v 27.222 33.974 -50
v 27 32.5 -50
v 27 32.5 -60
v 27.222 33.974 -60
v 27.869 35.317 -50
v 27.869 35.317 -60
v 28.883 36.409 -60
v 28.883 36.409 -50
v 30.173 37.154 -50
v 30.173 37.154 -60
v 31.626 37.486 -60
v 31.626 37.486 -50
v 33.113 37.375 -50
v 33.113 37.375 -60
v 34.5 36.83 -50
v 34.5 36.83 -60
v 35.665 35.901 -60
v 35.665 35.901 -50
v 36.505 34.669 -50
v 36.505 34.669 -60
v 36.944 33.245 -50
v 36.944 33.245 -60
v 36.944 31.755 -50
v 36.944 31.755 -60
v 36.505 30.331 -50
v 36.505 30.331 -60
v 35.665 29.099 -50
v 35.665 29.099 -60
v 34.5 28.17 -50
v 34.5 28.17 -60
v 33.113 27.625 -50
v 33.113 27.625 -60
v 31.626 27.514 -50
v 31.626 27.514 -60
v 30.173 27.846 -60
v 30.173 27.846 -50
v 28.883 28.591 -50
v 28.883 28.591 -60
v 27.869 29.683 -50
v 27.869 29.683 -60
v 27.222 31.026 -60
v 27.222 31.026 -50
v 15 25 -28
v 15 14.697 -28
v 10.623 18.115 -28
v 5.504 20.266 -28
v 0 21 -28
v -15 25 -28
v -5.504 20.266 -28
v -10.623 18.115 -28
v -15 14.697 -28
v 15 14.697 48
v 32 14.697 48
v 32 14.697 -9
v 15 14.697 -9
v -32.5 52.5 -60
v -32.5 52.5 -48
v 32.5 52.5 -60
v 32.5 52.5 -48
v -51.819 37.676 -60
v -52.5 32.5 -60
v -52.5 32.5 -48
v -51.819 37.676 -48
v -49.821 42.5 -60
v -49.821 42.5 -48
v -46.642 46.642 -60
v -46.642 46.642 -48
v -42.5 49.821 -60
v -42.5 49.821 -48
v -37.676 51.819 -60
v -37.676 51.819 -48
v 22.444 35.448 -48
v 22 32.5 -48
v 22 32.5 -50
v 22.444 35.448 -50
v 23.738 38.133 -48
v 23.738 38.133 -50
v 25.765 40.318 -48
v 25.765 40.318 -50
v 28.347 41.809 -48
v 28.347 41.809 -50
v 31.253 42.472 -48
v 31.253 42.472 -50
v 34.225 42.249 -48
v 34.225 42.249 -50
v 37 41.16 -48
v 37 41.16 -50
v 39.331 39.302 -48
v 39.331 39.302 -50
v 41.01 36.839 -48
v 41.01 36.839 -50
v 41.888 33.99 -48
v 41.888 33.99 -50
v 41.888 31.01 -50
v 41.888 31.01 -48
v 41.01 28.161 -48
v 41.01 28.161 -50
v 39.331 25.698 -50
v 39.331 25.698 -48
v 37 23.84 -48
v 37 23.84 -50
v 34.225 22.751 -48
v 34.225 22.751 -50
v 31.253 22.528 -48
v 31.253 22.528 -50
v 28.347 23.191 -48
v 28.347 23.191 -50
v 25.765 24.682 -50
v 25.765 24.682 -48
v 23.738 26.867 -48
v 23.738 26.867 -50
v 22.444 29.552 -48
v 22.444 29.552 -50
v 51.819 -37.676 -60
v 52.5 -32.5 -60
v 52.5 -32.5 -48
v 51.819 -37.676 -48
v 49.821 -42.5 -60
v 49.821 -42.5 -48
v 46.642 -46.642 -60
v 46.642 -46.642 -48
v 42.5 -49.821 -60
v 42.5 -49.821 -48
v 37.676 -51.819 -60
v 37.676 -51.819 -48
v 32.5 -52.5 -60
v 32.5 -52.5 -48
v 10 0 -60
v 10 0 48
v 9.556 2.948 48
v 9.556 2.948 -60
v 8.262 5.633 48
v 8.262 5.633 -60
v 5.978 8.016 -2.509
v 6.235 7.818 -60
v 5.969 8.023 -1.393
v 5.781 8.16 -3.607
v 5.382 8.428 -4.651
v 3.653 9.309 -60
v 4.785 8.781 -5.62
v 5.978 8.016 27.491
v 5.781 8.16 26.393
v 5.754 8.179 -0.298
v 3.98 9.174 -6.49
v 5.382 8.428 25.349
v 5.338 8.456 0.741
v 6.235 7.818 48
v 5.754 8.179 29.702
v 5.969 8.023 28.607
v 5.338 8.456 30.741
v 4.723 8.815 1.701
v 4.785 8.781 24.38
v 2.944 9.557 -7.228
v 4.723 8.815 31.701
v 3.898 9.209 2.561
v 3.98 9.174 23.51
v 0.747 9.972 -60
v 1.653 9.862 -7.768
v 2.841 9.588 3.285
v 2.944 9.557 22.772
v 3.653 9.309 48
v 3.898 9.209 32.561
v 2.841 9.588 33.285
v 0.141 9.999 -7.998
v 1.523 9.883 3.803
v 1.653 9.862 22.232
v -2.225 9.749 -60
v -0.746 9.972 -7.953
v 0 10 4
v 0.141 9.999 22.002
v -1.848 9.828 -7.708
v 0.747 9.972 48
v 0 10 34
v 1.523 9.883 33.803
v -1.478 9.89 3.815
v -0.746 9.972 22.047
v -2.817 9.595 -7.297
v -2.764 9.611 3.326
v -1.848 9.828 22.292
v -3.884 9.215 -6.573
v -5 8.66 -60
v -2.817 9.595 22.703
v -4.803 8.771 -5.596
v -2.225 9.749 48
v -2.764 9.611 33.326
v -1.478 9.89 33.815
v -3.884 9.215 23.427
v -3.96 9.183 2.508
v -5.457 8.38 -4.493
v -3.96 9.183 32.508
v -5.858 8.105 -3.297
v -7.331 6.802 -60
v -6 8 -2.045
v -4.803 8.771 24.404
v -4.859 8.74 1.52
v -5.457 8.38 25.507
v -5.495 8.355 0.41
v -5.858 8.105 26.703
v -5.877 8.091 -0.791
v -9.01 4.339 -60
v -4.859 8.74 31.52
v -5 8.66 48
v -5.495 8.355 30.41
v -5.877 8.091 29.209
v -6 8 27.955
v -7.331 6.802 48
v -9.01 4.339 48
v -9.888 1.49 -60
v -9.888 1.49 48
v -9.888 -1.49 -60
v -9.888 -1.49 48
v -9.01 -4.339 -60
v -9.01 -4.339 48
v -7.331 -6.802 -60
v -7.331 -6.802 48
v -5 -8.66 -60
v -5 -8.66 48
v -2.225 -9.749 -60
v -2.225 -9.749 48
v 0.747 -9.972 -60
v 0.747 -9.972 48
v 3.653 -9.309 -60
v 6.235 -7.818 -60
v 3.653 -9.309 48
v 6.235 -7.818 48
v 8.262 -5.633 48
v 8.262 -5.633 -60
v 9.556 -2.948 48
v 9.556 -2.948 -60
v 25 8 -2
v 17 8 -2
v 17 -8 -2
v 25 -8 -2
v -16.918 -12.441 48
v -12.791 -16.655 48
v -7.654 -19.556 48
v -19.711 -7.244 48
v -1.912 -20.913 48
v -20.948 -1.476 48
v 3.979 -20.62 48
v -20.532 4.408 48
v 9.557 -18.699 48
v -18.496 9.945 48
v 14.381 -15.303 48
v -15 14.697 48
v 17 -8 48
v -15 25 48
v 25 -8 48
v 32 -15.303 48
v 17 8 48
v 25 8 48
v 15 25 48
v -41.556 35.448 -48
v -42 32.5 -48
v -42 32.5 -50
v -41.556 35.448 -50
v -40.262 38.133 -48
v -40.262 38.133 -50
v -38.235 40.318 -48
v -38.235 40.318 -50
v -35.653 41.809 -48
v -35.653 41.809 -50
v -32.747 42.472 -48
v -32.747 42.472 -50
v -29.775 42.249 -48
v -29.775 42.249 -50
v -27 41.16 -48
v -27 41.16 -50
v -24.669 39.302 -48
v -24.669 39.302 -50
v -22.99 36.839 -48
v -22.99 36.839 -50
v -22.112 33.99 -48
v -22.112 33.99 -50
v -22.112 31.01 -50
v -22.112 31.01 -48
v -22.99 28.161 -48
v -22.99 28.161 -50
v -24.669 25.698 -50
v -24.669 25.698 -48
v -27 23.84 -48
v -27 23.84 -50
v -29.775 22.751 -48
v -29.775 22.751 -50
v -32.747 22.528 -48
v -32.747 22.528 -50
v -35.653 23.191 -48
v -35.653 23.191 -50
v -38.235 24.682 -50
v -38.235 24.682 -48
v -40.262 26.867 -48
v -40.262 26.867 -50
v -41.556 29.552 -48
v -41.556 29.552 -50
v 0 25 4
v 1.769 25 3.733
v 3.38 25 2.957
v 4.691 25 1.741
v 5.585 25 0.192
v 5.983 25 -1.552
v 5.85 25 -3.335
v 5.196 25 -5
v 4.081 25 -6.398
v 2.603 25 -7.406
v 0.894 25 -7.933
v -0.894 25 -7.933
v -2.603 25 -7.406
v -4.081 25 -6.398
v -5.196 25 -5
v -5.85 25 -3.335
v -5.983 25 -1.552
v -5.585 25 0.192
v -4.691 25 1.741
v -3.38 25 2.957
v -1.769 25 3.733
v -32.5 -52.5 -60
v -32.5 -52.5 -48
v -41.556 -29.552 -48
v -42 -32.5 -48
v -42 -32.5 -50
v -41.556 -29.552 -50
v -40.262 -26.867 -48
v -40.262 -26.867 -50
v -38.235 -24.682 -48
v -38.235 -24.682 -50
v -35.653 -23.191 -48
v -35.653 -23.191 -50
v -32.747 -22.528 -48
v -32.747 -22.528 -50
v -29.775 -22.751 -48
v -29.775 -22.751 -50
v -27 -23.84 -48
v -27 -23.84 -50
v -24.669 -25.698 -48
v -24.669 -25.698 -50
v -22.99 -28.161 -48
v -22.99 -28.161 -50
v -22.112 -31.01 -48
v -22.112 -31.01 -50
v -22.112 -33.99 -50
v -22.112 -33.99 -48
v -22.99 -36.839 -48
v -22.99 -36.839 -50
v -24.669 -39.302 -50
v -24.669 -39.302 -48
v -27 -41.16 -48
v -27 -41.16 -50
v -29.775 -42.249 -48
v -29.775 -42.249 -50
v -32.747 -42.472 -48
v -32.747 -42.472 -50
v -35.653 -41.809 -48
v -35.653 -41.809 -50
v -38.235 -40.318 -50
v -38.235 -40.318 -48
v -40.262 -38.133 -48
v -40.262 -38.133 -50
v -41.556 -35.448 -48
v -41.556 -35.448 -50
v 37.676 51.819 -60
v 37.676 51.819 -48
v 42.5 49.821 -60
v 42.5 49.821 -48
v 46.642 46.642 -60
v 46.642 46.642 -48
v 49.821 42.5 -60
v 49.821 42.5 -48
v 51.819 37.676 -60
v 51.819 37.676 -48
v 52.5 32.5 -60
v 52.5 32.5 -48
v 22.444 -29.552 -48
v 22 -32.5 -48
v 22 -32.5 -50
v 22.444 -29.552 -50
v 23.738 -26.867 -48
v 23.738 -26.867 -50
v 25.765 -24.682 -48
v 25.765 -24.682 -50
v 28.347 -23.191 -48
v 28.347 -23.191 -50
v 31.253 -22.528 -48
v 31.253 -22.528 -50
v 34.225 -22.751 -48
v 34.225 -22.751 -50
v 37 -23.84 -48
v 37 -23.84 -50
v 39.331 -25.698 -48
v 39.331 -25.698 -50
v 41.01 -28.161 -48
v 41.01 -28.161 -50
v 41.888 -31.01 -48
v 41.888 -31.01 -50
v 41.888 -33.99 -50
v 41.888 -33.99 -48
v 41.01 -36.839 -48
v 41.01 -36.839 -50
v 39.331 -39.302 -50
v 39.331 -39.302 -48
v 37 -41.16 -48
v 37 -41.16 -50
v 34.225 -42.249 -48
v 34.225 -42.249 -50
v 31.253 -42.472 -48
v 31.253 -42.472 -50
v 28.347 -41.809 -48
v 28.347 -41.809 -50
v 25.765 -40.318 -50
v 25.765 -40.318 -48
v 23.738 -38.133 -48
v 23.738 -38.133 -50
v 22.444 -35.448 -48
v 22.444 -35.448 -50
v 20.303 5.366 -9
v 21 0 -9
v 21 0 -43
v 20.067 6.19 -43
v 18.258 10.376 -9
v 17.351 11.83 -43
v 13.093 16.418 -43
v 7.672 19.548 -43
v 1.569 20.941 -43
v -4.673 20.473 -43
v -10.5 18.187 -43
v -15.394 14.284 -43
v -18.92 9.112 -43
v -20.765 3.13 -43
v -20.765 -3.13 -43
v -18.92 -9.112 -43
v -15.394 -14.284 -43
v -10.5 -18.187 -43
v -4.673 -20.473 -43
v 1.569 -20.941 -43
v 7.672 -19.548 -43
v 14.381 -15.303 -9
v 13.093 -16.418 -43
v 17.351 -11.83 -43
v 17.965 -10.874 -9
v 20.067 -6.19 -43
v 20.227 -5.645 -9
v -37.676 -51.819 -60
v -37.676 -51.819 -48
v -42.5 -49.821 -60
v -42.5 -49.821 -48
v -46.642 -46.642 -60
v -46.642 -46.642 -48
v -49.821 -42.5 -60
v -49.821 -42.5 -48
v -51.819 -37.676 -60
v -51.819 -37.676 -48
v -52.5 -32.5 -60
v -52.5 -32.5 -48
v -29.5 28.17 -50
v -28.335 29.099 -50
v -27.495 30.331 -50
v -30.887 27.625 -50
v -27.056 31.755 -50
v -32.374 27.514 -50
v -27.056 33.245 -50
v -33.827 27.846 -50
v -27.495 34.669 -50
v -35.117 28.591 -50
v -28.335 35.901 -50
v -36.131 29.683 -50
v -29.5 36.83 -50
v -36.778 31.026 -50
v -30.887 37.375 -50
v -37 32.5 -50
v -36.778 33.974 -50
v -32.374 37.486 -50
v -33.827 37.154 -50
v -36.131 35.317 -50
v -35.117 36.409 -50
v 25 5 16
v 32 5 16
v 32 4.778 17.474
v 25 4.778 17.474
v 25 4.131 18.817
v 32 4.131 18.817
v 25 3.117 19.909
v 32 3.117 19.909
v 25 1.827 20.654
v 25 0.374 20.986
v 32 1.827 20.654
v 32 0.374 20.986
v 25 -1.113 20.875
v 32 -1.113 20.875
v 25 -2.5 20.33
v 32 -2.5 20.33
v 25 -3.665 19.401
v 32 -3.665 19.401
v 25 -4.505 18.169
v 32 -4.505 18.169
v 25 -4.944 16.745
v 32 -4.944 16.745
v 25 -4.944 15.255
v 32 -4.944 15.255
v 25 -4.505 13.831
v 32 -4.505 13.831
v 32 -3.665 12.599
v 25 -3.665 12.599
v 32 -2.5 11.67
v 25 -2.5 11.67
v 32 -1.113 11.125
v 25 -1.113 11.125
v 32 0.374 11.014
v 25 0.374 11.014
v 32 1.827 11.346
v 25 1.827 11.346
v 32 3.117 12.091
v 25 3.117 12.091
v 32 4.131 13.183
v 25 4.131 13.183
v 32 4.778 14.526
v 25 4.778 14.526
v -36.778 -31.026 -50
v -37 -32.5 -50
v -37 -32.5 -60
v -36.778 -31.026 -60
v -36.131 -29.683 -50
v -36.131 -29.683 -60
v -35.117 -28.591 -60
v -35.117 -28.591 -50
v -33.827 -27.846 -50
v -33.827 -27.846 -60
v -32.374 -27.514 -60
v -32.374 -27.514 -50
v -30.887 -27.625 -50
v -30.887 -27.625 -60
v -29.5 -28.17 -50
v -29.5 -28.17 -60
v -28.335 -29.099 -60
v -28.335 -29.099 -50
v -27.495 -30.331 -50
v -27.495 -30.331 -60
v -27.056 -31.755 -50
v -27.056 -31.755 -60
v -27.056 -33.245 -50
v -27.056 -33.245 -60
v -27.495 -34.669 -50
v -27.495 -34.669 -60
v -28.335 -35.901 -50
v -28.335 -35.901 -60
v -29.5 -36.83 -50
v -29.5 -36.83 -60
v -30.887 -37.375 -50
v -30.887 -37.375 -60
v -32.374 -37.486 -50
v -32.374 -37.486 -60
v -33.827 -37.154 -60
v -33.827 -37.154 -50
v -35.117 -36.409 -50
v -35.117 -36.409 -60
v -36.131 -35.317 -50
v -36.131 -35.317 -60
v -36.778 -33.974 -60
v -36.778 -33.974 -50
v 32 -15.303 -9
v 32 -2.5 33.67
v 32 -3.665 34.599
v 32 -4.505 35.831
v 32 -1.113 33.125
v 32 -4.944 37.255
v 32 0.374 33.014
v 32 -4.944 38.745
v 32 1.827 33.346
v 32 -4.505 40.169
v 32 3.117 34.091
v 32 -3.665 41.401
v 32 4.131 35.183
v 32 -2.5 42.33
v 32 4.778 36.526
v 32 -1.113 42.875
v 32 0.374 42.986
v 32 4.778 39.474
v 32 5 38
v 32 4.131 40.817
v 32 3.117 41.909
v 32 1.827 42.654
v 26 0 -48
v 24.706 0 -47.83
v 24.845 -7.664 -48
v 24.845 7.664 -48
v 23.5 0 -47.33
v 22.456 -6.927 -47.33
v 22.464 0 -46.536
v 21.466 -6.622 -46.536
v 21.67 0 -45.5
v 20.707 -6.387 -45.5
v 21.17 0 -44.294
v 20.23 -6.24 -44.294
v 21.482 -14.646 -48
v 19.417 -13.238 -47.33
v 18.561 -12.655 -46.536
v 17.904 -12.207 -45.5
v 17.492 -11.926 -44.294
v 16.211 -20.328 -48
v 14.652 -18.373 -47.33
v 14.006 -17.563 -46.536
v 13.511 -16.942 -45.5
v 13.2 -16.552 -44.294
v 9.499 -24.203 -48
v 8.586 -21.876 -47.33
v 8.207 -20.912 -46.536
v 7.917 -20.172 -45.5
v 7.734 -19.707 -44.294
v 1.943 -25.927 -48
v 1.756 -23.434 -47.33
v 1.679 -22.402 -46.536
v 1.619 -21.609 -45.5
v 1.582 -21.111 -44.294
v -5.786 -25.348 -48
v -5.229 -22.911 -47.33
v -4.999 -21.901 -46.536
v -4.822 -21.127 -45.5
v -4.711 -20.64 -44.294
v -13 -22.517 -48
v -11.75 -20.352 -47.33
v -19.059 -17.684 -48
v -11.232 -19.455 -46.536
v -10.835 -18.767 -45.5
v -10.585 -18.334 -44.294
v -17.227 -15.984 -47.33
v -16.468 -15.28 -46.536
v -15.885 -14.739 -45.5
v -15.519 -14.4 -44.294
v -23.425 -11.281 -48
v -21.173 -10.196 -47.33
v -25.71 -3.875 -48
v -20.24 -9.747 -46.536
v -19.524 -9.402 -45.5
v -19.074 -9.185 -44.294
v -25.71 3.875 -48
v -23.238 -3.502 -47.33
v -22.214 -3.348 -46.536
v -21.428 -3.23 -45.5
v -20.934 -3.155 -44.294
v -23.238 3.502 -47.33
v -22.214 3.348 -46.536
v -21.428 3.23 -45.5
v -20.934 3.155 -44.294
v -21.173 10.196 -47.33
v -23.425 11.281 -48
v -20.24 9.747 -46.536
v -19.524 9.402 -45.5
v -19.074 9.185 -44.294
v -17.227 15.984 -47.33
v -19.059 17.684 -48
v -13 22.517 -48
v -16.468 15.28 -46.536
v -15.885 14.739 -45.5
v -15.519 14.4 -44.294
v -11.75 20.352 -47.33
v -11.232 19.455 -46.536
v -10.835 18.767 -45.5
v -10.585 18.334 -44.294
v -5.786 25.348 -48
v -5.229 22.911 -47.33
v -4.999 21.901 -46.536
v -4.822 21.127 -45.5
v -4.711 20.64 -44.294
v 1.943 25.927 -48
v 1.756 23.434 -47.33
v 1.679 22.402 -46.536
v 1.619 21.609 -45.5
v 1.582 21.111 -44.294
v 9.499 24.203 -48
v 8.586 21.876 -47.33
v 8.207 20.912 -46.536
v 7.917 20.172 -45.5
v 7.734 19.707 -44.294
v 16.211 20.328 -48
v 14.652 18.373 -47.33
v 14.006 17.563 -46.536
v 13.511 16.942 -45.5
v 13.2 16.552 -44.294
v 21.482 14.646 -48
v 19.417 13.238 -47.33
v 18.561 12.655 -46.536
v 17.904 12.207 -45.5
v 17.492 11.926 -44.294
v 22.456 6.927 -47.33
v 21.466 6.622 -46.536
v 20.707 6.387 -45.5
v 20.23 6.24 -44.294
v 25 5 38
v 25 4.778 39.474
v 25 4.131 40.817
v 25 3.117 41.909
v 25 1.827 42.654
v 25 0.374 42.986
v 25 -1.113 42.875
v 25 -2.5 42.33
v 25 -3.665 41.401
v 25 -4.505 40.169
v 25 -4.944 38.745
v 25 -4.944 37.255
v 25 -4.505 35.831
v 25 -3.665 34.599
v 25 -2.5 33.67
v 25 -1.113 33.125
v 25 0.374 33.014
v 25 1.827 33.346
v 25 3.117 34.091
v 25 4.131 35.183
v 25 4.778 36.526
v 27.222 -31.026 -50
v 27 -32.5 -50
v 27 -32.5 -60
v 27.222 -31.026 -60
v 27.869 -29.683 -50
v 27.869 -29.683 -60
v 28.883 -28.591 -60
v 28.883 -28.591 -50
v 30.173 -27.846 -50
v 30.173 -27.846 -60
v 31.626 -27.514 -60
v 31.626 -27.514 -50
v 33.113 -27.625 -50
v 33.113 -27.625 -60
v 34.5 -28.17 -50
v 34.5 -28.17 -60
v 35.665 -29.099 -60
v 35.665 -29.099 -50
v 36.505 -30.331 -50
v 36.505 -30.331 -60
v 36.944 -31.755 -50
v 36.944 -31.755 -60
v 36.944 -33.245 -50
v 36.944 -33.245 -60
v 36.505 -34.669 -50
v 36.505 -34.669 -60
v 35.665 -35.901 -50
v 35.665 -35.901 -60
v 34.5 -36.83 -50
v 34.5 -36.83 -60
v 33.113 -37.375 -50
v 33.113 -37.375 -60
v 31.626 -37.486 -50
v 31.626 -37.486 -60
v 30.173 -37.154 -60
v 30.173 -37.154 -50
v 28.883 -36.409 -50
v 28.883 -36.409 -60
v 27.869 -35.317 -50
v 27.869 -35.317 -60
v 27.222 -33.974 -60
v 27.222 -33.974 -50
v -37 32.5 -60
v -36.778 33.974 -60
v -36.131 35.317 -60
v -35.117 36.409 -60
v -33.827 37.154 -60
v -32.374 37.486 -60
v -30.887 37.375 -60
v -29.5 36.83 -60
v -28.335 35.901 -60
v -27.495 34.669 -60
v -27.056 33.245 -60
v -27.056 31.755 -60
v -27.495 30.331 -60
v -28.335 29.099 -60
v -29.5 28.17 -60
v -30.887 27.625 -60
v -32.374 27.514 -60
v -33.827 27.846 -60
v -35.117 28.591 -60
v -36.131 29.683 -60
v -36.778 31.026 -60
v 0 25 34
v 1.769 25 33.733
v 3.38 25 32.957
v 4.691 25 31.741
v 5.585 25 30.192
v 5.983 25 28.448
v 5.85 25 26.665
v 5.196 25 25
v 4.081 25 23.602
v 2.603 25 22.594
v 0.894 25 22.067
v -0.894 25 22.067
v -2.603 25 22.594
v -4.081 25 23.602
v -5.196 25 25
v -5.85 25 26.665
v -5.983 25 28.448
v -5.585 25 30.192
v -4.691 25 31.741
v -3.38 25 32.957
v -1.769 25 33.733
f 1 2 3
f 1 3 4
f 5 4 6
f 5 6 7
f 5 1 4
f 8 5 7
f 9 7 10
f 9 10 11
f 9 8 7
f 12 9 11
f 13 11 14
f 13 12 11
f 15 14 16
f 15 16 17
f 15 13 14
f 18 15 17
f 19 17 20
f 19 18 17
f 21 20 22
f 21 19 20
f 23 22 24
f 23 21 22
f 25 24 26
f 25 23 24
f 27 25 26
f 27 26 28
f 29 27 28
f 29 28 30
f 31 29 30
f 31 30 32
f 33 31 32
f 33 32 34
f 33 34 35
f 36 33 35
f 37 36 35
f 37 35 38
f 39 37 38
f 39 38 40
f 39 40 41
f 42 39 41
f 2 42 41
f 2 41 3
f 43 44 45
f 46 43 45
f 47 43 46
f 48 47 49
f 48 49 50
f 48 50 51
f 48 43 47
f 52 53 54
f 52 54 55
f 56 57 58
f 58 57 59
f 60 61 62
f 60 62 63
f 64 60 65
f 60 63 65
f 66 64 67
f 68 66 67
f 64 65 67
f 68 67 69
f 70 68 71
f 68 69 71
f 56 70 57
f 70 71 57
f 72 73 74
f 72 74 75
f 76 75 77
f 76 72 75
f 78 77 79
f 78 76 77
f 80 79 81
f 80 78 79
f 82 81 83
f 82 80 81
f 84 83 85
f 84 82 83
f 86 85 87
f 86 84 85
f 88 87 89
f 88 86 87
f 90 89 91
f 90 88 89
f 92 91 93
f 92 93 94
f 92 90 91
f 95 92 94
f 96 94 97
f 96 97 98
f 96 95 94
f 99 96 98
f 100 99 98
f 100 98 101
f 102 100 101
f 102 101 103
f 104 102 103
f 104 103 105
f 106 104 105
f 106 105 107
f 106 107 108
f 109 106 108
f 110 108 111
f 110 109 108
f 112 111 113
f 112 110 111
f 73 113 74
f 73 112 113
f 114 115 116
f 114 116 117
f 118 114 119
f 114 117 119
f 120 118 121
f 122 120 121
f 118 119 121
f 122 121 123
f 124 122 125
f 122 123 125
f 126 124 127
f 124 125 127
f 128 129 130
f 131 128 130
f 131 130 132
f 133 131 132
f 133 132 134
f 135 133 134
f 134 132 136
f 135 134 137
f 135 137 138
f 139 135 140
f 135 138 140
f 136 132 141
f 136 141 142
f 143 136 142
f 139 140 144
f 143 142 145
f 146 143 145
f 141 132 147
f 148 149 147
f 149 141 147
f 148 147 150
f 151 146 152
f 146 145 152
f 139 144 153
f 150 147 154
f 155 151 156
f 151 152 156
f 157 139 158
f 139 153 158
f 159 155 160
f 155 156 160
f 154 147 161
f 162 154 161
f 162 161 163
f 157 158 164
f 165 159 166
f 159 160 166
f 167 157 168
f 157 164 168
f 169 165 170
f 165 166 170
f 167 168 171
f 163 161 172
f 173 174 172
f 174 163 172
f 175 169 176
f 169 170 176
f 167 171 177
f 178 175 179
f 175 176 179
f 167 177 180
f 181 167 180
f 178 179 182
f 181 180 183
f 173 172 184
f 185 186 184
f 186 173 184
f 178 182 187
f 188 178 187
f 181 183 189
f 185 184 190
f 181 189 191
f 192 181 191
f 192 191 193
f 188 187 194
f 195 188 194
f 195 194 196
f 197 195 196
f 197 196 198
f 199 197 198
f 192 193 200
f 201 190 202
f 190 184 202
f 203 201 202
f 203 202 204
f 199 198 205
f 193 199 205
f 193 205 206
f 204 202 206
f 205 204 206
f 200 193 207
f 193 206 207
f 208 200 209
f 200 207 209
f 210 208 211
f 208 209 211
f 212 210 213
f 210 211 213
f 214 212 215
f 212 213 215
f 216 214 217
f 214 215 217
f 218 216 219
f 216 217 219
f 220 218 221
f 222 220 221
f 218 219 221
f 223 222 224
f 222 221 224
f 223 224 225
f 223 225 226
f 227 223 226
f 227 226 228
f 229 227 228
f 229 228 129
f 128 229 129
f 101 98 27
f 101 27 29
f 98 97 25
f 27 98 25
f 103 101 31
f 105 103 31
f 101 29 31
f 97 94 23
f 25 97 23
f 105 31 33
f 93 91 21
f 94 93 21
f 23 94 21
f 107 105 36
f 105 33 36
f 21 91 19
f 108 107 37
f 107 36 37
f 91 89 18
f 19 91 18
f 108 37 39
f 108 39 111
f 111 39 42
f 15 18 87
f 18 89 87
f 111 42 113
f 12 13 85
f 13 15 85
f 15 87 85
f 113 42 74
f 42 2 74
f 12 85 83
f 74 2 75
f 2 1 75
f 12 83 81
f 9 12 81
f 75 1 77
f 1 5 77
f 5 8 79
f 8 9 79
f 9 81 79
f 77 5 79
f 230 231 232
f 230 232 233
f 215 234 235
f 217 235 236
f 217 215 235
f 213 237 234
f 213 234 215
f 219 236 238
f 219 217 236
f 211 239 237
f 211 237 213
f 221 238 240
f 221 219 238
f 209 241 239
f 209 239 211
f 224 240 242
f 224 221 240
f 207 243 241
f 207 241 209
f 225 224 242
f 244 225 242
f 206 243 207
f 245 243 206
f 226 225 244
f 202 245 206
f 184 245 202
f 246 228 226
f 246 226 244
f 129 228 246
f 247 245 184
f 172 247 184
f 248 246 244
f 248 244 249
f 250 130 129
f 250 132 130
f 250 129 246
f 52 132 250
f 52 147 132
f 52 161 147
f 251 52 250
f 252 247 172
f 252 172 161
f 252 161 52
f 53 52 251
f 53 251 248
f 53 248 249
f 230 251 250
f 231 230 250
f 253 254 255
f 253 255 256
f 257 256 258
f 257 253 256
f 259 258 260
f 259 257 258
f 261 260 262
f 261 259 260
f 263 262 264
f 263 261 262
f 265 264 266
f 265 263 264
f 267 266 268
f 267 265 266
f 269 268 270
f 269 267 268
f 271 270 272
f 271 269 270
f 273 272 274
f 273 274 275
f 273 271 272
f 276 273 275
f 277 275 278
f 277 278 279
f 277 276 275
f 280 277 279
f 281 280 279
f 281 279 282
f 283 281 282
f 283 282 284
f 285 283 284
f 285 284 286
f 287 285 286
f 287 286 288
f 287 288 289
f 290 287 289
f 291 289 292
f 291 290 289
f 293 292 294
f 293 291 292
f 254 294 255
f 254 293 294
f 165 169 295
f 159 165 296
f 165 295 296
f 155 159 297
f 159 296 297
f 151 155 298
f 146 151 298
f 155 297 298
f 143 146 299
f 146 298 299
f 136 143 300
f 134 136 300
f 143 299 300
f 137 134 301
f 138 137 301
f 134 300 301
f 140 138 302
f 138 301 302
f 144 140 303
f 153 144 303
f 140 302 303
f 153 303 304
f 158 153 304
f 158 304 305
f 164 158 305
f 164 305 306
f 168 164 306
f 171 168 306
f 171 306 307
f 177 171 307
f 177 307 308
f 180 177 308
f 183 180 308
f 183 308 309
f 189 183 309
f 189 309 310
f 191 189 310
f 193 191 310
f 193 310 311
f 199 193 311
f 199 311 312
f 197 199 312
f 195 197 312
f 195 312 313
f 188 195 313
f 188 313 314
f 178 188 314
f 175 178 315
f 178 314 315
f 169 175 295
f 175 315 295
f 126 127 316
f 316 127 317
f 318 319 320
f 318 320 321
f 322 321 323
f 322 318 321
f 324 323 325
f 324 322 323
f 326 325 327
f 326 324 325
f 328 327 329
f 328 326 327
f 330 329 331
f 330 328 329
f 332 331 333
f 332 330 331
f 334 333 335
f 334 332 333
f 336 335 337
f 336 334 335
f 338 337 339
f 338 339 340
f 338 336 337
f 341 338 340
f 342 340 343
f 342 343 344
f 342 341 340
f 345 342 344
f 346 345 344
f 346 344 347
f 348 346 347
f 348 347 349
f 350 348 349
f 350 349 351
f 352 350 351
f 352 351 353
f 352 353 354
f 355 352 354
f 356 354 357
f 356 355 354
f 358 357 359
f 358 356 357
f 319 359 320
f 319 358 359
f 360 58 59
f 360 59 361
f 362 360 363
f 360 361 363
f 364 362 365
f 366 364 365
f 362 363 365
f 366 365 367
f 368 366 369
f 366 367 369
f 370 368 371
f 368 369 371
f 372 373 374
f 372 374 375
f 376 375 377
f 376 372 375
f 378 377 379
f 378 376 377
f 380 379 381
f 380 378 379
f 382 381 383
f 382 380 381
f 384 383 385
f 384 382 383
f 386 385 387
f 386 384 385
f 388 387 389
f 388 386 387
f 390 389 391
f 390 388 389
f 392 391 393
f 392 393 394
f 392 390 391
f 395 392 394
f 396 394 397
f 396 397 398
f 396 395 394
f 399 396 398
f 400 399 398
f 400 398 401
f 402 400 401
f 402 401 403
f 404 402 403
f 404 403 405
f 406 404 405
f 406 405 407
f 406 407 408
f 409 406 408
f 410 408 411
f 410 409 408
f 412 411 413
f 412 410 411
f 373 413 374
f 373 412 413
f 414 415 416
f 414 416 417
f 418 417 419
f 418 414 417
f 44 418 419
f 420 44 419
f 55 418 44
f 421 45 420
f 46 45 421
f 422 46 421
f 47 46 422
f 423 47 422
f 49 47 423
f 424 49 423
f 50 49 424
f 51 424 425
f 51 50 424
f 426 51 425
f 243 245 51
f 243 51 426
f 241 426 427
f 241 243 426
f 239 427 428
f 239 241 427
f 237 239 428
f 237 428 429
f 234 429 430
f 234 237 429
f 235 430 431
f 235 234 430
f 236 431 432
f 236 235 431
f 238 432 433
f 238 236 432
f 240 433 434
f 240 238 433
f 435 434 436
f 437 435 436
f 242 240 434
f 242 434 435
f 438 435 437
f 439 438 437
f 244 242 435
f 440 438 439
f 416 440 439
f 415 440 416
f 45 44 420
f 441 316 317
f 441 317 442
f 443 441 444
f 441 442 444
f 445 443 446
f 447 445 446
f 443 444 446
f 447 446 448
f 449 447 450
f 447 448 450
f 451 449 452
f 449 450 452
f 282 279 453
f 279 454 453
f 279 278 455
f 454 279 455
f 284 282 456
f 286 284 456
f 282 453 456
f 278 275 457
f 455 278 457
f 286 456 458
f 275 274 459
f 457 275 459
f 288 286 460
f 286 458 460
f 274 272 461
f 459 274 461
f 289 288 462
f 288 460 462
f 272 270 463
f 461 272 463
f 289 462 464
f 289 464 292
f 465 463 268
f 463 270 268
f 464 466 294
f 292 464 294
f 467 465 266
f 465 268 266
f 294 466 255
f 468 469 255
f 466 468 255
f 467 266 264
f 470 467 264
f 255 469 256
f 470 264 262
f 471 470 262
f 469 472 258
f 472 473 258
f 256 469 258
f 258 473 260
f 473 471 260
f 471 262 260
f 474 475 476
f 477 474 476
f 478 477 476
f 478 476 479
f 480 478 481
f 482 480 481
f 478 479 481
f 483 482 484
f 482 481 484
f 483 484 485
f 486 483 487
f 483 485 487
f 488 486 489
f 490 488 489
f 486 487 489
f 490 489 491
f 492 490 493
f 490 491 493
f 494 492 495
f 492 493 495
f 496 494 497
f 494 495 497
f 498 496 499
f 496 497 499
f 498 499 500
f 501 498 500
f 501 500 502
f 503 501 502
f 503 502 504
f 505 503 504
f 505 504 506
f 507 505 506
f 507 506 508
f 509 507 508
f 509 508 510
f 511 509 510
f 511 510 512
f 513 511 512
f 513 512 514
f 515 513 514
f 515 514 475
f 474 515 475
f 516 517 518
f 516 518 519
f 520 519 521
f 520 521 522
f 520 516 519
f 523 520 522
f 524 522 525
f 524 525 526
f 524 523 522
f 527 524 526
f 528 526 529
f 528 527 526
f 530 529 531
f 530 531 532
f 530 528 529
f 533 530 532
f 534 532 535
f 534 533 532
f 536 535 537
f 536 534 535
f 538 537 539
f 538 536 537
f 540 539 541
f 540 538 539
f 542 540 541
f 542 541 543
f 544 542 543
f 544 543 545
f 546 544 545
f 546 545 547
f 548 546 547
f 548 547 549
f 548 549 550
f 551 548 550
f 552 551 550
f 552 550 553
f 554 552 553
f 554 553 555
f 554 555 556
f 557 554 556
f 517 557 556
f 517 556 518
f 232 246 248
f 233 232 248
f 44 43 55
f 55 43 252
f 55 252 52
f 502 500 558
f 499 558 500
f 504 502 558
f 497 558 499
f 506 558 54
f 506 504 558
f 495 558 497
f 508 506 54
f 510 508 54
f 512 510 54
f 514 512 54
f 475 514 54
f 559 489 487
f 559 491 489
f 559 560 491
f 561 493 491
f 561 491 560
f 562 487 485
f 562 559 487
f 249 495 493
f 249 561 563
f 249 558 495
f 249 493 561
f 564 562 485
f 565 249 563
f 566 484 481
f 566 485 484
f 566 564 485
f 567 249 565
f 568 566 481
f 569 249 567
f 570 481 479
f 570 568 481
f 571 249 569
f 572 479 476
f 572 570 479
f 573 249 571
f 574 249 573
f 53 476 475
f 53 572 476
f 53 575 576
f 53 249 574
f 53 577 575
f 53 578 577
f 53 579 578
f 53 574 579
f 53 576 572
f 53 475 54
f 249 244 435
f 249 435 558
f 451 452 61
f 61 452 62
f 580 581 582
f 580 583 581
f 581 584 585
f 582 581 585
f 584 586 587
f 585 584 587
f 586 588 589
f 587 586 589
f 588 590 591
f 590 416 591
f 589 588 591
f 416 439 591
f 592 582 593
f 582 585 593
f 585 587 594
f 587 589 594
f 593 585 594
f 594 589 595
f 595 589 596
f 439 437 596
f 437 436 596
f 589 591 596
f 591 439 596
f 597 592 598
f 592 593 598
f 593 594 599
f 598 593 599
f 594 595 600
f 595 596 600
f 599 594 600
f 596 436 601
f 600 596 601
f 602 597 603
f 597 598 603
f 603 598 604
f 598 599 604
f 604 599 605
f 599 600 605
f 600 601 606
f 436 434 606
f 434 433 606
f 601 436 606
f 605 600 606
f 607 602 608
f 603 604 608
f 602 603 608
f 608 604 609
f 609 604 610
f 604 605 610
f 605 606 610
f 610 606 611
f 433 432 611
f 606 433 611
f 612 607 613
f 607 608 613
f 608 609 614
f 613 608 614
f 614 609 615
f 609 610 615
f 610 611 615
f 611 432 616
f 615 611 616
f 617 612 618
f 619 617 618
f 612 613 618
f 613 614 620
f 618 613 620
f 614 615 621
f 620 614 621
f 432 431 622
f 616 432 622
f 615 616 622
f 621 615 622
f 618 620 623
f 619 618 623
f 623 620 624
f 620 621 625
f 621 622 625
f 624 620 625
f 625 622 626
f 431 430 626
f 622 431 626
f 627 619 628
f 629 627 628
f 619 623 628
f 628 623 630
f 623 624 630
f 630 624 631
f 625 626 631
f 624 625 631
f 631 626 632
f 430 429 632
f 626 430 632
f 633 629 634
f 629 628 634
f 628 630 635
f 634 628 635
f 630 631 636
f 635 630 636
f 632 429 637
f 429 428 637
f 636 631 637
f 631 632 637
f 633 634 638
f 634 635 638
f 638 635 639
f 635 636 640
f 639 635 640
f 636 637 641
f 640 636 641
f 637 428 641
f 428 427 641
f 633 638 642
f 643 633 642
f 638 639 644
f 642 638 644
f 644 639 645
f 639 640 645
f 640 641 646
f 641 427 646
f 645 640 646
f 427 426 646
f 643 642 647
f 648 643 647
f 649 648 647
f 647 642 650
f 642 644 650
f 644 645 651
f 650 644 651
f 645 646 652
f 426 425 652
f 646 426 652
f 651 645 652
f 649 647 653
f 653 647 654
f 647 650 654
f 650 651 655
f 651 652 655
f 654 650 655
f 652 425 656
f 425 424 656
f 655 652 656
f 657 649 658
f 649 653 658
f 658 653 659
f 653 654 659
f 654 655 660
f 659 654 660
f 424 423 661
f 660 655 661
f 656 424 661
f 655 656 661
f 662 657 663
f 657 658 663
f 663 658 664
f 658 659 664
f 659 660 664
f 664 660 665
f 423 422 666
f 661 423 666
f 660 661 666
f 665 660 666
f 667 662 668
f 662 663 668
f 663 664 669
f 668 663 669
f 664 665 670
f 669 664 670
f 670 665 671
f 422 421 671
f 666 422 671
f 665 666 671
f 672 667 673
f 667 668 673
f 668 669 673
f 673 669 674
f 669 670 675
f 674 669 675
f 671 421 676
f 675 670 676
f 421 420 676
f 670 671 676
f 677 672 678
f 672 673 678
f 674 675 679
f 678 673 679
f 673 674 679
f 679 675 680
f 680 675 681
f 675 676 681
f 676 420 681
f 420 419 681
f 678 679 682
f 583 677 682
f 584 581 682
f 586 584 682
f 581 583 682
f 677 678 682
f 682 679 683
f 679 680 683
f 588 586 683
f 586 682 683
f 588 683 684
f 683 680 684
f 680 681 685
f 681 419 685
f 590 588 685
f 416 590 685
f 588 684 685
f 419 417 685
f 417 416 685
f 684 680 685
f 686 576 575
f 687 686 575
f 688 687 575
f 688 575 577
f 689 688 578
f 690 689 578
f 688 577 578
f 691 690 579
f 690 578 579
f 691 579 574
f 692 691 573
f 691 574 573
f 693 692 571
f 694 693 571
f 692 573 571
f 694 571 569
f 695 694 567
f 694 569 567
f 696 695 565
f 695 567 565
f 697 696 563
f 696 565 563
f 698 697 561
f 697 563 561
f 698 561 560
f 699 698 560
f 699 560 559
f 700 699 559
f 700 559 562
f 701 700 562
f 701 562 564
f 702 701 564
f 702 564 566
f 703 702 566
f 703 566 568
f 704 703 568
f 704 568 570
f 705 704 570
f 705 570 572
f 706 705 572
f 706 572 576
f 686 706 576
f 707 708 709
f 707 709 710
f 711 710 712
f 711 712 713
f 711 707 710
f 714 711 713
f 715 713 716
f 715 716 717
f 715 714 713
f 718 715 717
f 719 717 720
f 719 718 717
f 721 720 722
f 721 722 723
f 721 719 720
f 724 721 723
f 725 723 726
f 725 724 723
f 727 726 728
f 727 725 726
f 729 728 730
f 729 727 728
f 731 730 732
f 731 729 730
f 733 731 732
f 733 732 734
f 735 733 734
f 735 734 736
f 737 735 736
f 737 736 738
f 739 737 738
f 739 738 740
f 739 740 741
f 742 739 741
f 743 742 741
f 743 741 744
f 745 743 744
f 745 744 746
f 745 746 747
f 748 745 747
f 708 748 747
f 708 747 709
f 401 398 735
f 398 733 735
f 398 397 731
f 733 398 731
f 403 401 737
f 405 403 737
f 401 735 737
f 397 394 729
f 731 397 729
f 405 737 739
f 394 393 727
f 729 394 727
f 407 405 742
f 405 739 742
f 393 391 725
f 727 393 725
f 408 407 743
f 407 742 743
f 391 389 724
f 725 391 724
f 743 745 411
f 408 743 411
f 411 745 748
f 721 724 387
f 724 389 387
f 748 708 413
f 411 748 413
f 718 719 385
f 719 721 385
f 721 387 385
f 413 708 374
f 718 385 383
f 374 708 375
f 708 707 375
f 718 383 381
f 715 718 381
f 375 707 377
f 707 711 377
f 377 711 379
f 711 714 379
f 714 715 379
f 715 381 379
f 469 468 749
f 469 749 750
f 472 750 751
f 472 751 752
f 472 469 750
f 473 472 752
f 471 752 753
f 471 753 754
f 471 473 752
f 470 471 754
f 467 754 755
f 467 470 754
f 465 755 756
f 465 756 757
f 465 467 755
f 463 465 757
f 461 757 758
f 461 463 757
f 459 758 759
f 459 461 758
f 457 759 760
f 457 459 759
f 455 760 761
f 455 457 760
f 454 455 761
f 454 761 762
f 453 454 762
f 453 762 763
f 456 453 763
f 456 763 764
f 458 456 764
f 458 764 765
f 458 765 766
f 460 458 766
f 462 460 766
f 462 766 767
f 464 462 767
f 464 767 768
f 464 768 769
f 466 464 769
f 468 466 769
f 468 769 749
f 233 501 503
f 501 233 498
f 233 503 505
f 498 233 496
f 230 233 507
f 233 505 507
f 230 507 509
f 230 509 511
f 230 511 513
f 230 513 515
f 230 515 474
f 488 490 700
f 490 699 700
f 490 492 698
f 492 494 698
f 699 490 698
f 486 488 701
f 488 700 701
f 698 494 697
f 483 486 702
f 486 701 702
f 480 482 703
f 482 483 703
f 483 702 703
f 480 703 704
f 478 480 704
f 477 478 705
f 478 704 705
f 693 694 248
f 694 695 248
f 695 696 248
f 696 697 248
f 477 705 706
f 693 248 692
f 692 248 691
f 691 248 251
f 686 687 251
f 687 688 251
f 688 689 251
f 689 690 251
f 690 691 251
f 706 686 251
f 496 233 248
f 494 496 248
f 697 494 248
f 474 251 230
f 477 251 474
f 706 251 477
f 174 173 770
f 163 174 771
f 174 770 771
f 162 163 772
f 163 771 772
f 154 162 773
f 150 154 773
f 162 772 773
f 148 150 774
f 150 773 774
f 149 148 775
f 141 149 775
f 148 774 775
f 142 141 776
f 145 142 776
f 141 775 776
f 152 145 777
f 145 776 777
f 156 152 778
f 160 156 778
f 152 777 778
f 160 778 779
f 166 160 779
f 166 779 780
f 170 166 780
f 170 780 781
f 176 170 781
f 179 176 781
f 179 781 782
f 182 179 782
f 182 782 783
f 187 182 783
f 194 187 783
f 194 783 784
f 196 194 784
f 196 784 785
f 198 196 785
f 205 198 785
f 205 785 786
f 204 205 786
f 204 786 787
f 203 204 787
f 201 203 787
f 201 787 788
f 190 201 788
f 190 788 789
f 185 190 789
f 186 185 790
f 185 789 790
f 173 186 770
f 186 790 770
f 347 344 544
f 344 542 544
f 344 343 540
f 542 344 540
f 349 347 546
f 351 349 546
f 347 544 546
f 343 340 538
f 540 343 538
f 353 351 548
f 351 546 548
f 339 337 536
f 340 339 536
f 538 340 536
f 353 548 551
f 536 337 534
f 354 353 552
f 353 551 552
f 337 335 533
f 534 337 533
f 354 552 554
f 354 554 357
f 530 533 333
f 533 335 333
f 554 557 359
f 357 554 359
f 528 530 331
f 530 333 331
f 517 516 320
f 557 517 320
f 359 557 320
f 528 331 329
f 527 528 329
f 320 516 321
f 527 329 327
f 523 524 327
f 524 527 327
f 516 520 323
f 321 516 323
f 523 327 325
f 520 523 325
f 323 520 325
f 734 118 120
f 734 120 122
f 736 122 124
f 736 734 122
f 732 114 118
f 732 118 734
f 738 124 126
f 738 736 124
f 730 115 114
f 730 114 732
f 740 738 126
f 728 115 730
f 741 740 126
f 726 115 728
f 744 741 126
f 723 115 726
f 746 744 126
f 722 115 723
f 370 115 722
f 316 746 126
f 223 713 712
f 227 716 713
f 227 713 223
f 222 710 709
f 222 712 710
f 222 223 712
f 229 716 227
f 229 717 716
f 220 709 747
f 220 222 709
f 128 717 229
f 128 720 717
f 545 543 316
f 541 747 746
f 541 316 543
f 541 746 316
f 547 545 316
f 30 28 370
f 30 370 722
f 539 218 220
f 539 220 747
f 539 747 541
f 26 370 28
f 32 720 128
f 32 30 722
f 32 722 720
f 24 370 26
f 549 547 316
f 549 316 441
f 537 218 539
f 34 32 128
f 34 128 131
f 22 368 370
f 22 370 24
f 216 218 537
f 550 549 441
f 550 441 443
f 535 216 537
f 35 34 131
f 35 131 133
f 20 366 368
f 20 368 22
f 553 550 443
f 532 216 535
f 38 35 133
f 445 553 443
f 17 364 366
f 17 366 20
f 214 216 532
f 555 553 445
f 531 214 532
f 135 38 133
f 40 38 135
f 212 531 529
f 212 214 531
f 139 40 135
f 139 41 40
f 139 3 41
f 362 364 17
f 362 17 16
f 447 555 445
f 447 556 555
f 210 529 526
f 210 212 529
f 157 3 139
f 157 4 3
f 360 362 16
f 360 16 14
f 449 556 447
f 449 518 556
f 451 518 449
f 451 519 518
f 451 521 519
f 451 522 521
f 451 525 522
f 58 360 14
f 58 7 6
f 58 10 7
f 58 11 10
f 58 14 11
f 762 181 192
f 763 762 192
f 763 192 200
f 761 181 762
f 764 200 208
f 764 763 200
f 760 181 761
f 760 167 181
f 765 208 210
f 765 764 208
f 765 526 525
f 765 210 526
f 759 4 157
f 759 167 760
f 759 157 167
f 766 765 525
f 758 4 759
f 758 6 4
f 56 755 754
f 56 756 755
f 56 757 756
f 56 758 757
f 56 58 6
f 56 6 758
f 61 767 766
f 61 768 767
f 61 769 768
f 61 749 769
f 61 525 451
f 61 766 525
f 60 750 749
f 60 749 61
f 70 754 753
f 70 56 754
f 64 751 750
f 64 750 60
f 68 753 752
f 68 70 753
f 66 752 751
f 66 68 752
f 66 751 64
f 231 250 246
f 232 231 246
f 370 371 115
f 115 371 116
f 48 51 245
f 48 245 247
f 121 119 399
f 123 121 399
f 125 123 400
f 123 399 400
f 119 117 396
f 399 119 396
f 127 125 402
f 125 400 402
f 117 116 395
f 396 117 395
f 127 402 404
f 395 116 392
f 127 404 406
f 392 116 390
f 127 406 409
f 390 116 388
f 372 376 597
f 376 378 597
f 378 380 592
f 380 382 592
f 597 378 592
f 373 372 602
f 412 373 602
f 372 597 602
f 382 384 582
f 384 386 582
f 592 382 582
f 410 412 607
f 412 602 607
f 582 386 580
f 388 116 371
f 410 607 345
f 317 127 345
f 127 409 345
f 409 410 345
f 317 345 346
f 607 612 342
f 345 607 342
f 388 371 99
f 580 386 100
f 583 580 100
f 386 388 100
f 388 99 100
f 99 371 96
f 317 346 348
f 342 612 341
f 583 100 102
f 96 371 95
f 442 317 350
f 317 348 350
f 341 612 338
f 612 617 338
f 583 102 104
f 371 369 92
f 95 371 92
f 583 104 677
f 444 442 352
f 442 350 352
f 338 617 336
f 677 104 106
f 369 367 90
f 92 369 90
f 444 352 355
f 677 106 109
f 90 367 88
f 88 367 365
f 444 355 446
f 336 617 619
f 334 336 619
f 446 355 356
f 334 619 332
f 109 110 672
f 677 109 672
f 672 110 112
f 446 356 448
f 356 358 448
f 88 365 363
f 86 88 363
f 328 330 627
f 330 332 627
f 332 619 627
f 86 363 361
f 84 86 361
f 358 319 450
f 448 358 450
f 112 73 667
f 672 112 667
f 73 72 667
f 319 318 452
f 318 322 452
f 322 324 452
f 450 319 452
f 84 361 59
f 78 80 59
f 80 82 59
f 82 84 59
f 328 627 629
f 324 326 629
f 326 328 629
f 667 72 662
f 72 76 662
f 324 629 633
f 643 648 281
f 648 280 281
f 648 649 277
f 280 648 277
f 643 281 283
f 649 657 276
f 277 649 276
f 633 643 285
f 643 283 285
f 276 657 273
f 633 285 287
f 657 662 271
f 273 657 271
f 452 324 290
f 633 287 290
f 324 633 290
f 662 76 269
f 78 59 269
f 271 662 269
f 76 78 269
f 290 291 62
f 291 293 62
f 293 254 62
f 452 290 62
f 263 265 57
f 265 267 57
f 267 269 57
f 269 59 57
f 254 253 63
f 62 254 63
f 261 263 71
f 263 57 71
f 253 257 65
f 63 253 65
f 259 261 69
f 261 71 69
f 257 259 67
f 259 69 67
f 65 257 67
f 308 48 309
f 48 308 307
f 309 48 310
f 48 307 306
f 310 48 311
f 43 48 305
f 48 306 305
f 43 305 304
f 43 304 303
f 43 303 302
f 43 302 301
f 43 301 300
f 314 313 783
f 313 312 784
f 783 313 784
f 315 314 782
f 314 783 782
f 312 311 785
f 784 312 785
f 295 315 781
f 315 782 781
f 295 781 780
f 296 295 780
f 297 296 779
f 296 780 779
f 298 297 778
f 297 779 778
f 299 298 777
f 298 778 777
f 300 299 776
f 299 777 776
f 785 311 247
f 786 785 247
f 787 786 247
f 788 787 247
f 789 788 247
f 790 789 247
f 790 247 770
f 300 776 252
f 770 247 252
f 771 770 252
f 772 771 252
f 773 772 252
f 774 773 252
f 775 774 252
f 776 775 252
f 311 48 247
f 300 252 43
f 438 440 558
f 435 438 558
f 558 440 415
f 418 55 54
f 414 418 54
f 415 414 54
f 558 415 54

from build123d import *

# Parameters (mm, degrees)
SKETCH1_R               = 21
BOSS_EXTRUDE1_DEPTH     = 48
SKETCH2_R               = 10
SKETCH2_R_2             = 5
BOSS_EXTRUDE2_DEPTH     = 12
SKETCH2_3_R             = 10
SKETCH2_3_R_2           = 5
CUT_EXTRUDE1_DEPTH      = 2
FILLET8_R               = 5
BOSS_EXTRUDE3_DEPTH     = 76
BOSS_EXTRUDE4_DEPTH     = 57
CUT_EXTRUDE2_DEPTH      = 50
SKETCH5_R               = 10
CUT_EXTRUDE3_DEPTH      = 132.059146953
CUT_EXTRUDE4_REACH      = 113.187
CUT_EXTRUDE4_END_RADIUS = 10
SKETCH6_R               = 6
CUT_EXTRUDE5_REACH      = 118.174
SKETCH7_R               = 5


with BuildPart() as part:
    # Sketch1 → Boss-Extrude1 (new, symmetric)
    with BuildSketch(Plane.XY):
        Circle(SKETCH1_R)
    extrude(amount=BOSS_EXTRUDE1_DEPTH, both=True)

    # Sketch2 → Boss-Extrude2 (add)
    # profile 1 of 10: a face of its own
    with BuildSketch(Plane(origin=(0, 0, -48), x_dir=(-1, 0, 0), z_dir=(0, 0, -1))):
        with BuildLine():
            Line((0, 52.5), (-32.5, 52.5))
            ThreePointArc((-32.5, 52.5), (-46.642135624, 46.642135624), (-52.5, 32.5))
            Line((-52.5, 32.5), (-52.5, -32.5))
            ThreePointArc((-52.5, -32.5), (-46.642135624, -46.642135624), (-32.5, -52.5))
            Line((-32.5, -52.5), (0, -52.5))
            Line((0, -52.5), (0, -21))
            ThreePointArc((0, -21), (-21, 0), (0, 21))
            Line((0, 21), (0, 52.5))
        make_face()
        with Locations((-32, -32.5)):
            Circle(SKETCH2_R, mode=Mode.SUBTRACT)
        with Locations((-32, 32.5)):
            Circle(SKETCH2_R, mode=Mode.SUBTRACT)
    # profile 2 of 10: a face of its own
    with BuildSketch(Plane(origin=(0, 0, -48), x_dir=(-1, 0, 0), z_dir=(0, 0, -1))):
        with BuildLine():
            Line((32.5, 52.5), (0, 52.5))
            Line((0, 52.5), (0, 21))
            ThreePointArc((0, 21), (14.849242405, 14.849242405), (21, 0))
            ThreePointArc((21, 0), (14.849242405, -14.849242405), (0, -21))
            Line((0, -21), (0, -52.5))
            Line((0, -52.5), (32.5, -52.5))
            ThreePointArc((32.5, -52.5), (46.642135624, -46.642135624), (52.5, -32.5))
            Line((52.5, -32.5), (52.5, 32.5))
            ThreePointArc((52.5, 32.5), (46.642135624, 46.642135624), (32.5, 52.5))
        make_face()
        with Locations((32, -32.5)):
            Circle(SKETCH2_R, mode=Mode.SUBTRACT)
        with Locations((32, 32.5)):
            Circle(SKETCH2_R, mode=Mode.SUBTRACT)
    # profile 3 of 10: a face of its own
    with BuildSketch(Plane(origin=(0, 0, -48), x_dir=(-1, 0, 0), z_dir=(0, 0, -1))):
        with Locations((-32, 32.5)):
            Circle(SKETCH2_R)
        with Locations((-32, 32.5)):
            Circle(SKETCH2_R_2, mode=Mode.SUBTRACT)
    # profile 4 of 10: a face of its own
    with BuildSketch(Plane(origin=(0, 0, -48), x_dir=(-1, 0, 0), z_dir=(0, 0, -1))):
        with Locations((-32, -32.5)):
            Circle(SKETCH2_R)
        with Locations((-32, -32.5)):
            Circle(SKETCH2_R_2, mode=Mode.SUBTRACT)
    # profile 5 of 10: a face of its own
    with BuildSketch(Plane(origin=(0, 0, -48), x_dir=(-1, 0, 0), z_dir=(0, 0, -1))):
        with Locations((32, 32.5)):
            Circle(SKETCH2_R)
        with Locations((32, 32.5)):
            Circle(SKETCH2_R_2, mode=Mode.SUBTRACT)
    # profile 6 of 10: a face of its own
    with BuildSketch(Plane(origin=(0, 0, -48), x_dir=(-1, 0, 0), z_dir=(0, 0, -1))):
        with Locations((32, -32.5)):
            Circle(SKETCH2_R)
        with Locations((32, -32.5)):
            Circle(SKETCH2_R_2, mode=Mode.SUBTRACT)
    # profile 7 of 10: a face of its own
    with BuildSketch(Plane(origin=(0, 0, -48), x_dir=(-1, 0, 0), z_dir=(0, 0, -1))):
        with BuildLine():
            ThreePointArc((21, 0), (14.849242405, 14.849242405), (0, 21))
            Line((0, 21), (0, -21))
            ThreePointArc((0, -21), (14.849242405, -14.849242405), (21, 0))
        make_face()
    # profile 8 of 10: a face of its own
    with BuildSketch(Plane(origin=(0, 0, -48), x_dir=(-1, 0, 0), z_dir=(0, 0, -1))):
        with BuildLine():
            Line((0, -21), (0, 21))
            ThreePointArc((0, 21), (-21, 0), (0, -21))
        make_face()
    # profile 9 of 10: a face of its own
    with BuildSketch(Plane(origin=(0, 0, -48), x_dir=(-1, 0, 0), z_dir=(0, 0, -1))):
        with BuildLine():
            ThreePointArc((21, 0), (14.849242405, 14.849242405), (0, 21))
            Line((0, 21), (0, -21))
            ThreePointArc((0, -21), (14.849242405, -14.849242405), (21, 0))
        make_face()
    # profile 10 of 10: a face of its own
    with BuildSketch(Plane(origin=(0, 0, -48), x_dir=(-1, 0, 0), z_dir=(0, 0, -1))):
        with BuildLine():
            Line((0, -21), (0, 21))
            ThreePointArc((0, 21), (-21, 0), (0, -21))
        make_face()
    extrude(amount=BOSS_EXTRUDE2_DEPTH)

    # Sketch2<3> → Cut-Extrude1 (cut)
    # profile 1 of 4: a face of its own
    with BuildSketch(Plane(origin=(0, 0, -48), x_dir=(-1, 0, 0), z_dir=(0, 0, -1))):
        with Locations((32, 32.5)):
            Circle(SKETCH2_3_R)
        with Locations((32, 32.5)):
            Circle(SKETCH2_3_R_2, mode=Mode.SUBTRACT)
    # profile 2 of 4: a face of its own
    with BuildSketch(Plane(origin=(0, 0, -48), x_dir=(-1, 0, 0), z_dir=(0, 0, -1))):
        with Locations((-32, 32.5)):
            Circle(SKETCH2_3_R)
        with Locations((-32, 32.5)):
            Circle(SKETCH2_3_R_2, mode=Mode.SUBTRACT)
    # profile 3 of 4: a face of its own
    with BuildSketch(Plane(origin=(0, 0, -48), x_dir=(-1, 0, 0), z_dir=(0, 0, -1))):
        with Locations((-32, -32.5)):
            Circle(SKETCH2_3_R)
        with Locations((-32, -32.5)):
            Circle(SKETCH2_3_R_2, mode=Mode.SUBTRACT)
    # profile 4 of 4: a face of its own
    with BuildSketch(Plane(origin=(0, 0, -48), x_dir=(-1, 0, 0), z_dir=(0, 0, -1))):
        with Locations((32, -32.5)):
            Circle(SKETCH2_3_R)
        with Locations((32, -32.5)):
            Circle(SKETCH2_3_R_2, mode=Mode.SUBTRACT)
    extrude(amount=CUT_EXTRUDE1_DEPTH, mode=Mode.SUBTRACT)

    # Fillet8
    fillet8_edges = [part.edges().sort_by_distance(p)[0] for p in [
        (-21, 0, -48),
    ]]
    fillet(fillet8_edges, radius=FILLET8_R)

    # Sketch3 → Boss-Extrude3 (add)
    with BuildSketch(Plane.XY.offset(48)):
        with BuildLine():
            Line((-15, 25), (15, 25))
            Line((15, 25), (15, 14.696938457))
            ThreePointArc((15, 14.696938457), (0, 21), (-15, 14.696938457))
            Line((-15, 14.696938457), (-15, 25))
        make_face()
    extrude(amount=-BOSS_EXTRUDE3_DEPTH)

    # Sketch4 → Boss-Extrude4 (add)
    with BuildSketch(Plane.XY.offset(48)):
        with BuildLine():
            Line((32, 14.696938457), (15, 14.696938457))
            ThreePointArc((15, 14.696938457), (20.995532794, -0.433131267), (14.381109394, -15.303061543))
            Line((14.381109394, -15.303061543), (32, -15.303061543))
            Line((32, -15.303061543), (32, 14.696938457))
        make_face()
    extrude(amount=-BOSS_EXTRUDE4_DEPTH)

    # Sketch4<3> → Cut-Extrude2 (cut)
    with BuildSketch(Plane.XY.offset(48)):
        with BuildLine():
            ThreePointArc((19.416487839, -8), (21, 0), (19.416487839, 8))
            Line((19.416487839, 8), (17, 8))
            Line((17, 8), (17, -8))
            Line((17, -8), (19.416487839, -8))
        make_face()
        with BuildLine():
            Line((25, 8), (19.416487839, 8))
            ThreePointArc((19.416487839, 8), (21, 0), (19.416487839, -8))
            Line((19.416487839, -8), (25, -8))
            Line((25, -8), (25, 8))
        make_face()
    extrude(amount=-CUT_EXTRUDE2_DEPTH, mode=Mode.SUBTRACT)

    # Sketch5 → Cut-Extrude3 (cut, through all)
    with BuildSketch(Plane.XY.offset(48)):
        Circle(SKETCH5_R)
    extrude(amount=-CUT_EXTRUDE3_DEPTH, mode=Mode.SUBTRACT)

    # Cut-Extrude4: up to this cylinder (the profile starts outside it)
    cut_extrude4_end = Plane(origin=(0, 0, 13), z_dir=(0, 0, 1)) * Cylinder(CUT_EXTRUDE4_END_RADIUS, 277.374, mode=Mode.PRIVATE)
    # Sketch6 → Cut-Extrude4 (cut, up to the surface)
    with BuildSketch(Plane(origin=(0, 25, 0), x_dir=(1, 0, 0), z_dir=(0, 1, 0)), mode=Mode.PRIVATE) as cut_extrude4_sk1:
        with Locations(Location((0, 2, 0), (0, 0, 270))):
            Circle(SKETCH6_R)
    cut_extrude4_tool1 = extrude(cut_extrude4_sk1.sketch, amount=-CUT_EXTRUDE4_REACH, mode=Mode.PRIVATE) - cut_extrude4_end
    add(cut_extrude4_tool1.solids().sort_by_distance((0, 25, -2))[0], mode=Mode.SUBTRACT)
    # Sketch6 → Cut-Extrude4 (cut, up to the surface)
    with BuildSketch(Plane(origin=(0, 25, 0), x_dir=(1, 0, 0), z_dir=(0, 1, 0)), mode=Mode.PRIVATE) as cut_extrude4_sk2:
        with Locations(Location((0, -28, 0), (0, 0, 270))):
            Circle(SKETCH6_R)
    cut_extrude4_tool2 = extrude(cut_extrude4_sk2.sketch, amount=-CUT_EXTRUDE4_REACH, mode=Mode.PRIVATE) - cut_extrude4_end
    add(cut_extrude4_tool2.solids().sort_by_distance((0, 25, 28))[0], mode=Mode.SUBTRACT)

    # Sketch7 → Cut-Extrude5 (cut, up to next)
    with BuildSketch(Plane(origin=(32, 0, 0), x_dir=(0, 0, -1), z_dir=(1, 0, 0)), mode=Mode.PRIVATE) as cut_extrude5_sk1:
        with Locations(Location((-38, 0, 0), (0, 0, 90))):
            Circle(SKETCH7_R)
    cut_extrude5_tool1 = extrude(cut_extrude5_sk1.sketch, amount=-CUT_EXTRUDE5_REACH, mode=Mode.PRIVATE) & part.part
    # Sketch7 → Cut-Extrude5 (cut, up to next)
    with BuildSketch(Plane(origin=(32, 0, 0), x_dir=(0, 0, -1), z_dir=(1, 0, 0)), mode=Mode.PRIVATE) as cut_extrude5_sk2:
        with Locations(Location((-16, 0, 0), (0, 0, 90))):
            Circle(SKETCH7_R)
    cut_extrude5_tool2 = extrude(cut_extrude5_sk2.sketch, amount=-CUT_EXTRUDE5_REACH, mode=Mode.PRIVATE) & part.part
    add(cut_extrude5_tool1.solids().sort_by_distance((32, 0, 38))[0], mode=Mode.SUBTRACT)
    add(cut_extrude5_tool2.solids().sort_by_distance((32, 0, 16))[0], mode=Mode.SUBTRACT)


solid = part.part
